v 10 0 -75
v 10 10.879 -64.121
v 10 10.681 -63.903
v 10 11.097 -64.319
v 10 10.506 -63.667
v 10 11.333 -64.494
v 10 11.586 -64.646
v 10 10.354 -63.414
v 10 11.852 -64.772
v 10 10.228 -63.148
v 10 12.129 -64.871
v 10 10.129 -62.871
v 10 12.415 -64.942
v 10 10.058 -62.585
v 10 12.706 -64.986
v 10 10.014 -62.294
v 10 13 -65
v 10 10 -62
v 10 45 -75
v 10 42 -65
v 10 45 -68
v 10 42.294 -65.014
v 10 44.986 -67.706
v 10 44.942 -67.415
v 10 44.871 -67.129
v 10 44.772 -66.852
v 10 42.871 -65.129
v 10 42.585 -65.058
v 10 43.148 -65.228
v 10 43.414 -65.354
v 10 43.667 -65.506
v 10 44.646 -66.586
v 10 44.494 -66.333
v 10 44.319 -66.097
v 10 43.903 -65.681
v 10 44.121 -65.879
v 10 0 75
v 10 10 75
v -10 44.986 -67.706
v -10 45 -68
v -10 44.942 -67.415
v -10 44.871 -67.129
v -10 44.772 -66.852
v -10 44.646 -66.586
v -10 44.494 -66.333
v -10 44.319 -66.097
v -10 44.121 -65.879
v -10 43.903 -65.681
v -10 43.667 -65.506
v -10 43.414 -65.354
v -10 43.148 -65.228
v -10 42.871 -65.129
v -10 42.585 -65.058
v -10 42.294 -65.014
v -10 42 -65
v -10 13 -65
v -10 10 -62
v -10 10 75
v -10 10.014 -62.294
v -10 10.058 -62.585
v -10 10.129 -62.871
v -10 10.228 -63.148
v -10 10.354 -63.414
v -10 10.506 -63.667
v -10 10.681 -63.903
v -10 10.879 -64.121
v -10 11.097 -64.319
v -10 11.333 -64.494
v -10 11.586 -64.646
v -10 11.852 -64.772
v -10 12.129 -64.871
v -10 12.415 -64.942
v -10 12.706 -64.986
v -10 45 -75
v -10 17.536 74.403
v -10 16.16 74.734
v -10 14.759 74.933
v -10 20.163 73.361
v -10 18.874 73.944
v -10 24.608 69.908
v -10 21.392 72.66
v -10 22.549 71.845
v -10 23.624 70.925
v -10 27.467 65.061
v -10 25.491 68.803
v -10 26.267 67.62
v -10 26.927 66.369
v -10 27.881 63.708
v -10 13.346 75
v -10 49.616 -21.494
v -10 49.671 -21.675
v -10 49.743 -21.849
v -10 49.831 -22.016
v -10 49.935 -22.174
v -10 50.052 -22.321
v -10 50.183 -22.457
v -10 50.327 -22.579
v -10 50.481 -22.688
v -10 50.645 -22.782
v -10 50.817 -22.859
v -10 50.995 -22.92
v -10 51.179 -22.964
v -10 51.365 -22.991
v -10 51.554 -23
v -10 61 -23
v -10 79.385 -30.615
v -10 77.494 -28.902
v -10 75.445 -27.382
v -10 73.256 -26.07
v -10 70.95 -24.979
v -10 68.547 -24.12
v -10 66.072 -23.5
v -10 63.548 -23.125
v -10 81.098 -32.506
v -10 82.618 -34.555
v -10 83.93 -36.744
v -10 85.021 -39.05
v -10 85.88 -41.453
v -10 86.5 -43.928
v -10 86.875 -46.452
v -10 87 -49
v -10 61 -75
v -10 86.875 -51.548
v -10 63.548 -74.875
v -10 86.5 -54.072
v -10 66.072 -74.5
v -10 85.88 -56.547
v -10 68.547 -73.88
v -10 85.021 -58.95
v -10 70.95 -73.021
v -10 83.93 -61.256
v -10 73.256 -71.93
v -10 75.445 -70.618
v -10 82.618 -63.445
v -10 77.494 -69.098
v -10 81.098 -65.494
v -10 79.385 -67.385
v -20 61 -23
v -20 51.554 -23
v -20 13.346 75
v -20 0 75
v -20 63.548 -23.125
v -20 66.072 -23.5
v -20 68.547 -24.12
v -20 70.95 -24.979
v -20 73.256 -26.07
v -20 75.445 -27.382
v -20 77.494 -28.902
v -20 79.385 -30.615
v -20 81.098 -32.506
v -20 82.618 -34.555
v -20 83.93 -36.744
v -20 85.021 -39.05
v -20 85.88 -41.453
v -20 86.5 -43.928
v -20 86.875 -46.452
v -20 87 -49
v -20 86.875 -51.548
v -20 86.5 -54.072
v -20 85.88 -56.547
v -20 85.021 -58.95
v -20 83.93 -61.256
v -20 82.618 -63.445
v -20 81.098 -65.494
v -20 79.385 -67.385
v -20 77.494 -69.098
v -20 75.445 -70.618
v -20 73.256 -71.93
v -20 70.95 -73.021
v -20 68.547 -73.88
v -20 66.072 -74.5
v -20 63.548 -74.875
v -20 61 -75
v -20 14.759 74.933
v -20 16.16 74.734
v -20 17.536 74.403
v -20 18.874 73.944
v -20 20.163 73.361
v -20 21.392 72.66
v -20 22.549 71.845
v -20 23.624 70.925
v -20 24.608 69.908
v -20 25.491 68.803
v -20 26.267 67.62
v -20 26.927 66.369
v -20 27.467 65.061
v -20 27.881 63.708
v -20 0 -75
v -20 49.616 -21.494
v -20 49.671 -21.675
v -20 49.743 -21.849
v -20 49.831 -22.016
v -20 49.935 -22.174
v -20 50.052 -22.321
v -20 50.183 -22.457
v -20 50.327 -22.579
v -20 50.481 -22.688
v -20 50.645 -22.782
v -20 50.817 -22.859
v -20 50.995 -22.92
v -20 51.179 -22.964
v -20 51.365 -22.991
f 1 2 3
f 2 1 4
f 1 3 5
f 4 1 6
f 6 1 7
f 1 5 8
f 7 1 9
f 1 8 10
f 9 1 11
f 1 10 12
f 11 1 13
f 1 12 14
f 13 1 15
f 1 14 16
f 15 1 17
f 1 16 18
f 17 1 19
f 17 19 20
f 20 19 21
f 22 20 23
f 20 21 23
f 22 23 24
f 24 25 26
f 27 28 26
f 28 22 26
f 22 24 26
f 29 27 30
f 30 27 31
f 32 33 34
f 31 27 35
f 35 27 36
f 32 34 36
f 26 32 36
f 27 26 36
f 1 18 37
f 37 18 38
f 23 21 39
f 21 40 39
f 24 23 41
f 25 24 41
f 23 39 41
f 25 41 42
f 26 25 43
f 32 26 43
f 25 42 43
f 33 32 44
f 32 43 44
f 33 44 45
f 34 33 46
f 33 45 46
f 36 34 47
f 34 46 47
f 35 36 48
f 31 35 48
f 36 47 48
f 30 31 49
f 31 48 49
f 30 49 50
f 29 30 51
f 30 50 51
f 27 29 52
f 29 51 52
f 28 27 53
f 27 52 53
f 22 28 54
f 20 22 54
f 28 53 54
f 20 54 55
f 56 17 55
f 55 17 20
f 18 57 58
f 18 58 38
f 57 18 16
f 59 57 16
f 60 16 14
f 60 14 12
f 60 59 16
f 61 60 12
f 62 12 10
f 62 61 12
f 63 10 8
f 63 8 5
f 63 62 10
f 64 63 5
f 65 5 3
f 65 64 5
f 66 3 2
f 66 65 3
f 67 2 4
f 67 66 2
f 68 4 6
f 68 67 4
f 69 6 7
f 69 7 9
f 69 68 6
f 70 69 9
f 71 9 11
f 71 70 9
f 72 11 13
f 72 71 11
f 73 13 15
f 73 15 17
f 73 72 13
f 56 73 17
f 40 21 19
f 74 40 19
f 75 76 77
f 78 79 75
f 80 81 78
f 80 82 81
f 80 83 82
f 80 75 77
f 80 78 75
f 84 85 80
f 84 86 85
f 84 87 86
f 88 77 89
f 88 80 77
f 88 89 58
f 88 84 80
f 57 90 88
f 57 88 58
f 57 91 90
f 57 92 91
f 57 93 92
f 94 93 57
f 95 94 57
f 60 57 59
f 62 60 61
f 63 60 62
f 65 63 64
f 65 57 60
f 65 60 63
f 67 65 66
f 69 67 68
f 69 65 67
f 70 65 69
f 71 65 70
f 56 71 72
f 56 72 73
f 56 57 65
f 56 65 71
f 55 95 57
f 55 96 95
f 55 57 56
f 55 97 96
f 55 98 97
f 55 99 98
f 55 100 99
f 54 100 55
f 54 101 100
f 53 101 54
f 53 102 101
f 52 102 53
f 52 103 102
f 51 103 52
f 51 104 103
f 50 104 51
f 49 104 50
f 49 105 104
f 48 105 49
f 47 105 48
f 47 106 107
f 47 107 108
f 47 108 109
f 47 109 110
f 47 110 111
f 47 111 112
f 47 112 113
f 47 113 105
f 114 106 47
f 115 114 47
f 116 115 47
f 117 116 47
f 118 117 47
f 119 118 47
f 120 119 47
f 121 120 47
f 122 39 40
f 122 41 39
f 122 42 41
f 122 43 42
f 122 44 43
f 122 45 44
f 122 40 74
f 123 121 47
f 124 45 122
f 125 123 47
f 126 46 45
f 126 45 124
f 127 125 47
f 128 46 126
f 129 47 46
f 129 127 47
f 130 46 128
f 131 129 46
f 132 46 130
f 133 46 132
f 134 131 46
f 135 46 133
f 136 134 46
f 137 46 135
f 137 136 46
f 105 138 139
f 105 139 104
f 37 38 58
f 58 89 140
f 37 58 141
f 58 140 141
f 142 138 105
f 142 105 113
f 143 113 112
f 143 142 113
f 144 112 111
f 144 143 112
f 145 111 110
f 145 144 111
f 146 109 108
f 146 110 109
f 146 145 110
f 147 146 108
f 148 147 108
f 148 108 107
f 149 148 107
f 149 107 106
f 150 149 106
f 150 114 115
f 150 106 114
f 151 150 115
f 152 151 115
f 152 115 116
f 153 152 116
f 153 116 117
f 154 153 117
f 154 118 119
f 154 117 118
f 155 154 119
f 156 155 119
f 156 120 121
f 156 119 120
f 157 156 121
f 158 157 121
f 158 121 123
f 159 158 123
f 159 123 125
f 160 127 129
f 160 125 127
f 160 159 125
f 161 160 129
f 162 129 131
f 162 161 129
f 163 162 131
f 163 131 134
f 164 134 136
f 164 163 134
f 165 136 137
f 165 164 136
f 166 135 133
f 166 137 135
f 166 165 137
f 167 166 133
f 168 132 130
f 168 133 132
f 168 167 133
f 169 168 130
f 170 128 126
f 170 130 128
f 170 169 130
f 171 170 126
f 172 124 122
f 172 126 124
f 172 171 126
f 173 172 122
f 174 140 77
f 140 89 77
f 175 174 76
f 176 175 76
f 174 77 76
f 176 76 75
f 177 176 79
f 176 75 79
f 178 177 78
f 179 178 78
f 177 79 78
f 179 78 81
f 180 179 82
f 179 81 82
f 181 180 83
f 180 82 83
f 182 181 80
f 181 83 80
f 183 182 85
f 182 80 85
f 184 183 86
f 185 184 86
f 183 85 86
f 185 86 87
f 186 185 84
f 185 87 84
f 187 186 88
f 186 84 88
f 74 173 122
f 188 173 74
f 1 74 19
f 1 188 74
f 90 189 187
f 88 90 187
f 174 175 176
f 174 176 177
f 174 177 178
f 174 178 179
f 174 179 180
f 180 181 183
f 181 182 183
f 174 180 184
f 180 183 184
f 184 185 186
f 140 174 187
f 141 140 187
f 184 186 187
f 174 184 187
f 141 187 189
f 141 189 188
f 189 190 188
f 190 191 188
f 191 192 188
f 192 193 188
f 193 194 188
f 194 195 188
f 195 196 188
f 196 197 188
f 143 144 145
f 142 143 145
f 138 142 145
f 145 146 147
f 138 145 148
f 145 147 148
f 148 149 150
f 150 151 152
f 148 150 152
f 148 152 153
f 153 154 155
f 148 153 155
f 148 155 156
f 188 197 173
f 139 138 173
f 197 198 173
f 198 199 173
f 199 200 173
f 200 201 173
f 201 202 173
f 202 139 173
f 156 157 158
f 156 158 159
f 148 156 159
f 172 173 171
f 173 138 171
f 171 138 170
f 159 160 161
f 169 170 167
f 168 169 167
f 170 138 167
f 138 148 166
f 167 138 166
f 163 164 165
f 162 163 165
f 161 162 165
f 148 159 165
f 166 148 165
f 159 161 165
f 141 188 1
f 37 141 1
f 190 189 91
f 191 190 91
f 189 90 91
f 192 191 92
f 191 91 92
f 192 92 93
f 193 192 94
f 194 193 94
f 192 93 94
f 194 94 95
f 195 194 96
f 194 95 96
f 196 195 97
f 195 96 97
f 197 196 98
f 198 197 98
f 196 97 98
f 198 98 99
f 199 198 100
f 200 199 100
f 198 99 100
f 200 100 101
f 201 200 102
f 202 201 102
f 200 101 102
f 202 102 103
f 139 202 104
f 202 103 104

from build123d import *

# Parameters (mm, degrees)
SKETCH1_W                = 82
SKETCH1_H                = 150
BOSS_EXTRUDE1_DEPTH      = 10
SKETCH2_W                = 10
SKETCH2_H                = 45
BOSS_EXTRUDE2_DEPTH      = 82
BOSS_EXTRUDE3_DEPTH      = 42
BOSS_EXTRUDE3_DEPTH_BACK = 10
FILLET3_RADIUS           = 26
FILLET3_LENGTH           = 10
FILLET4_RADIUS           = 26
FILLET4_LENGTH           = 10
BOSS_EXTRUDE4_DEPTH      = 10
BOSS_EXTRUDE5_DEPTH      = 10
FILLET5_R                = 15
FILLET6_R                = 15
SKETCH6_R                = 8
SKETCH6_R_2              = 5.5
CUT_EXTRUDE1_DEPTH       = 131.057679512
FILLET7_R                = 3
FILLET8_R                = 3
FILLET9_R                = 3
FILLET10_R               = 3
FILLET11_R               = 2
SKETCH7_R                = 5.5
CUT_EXTRUDE2_DEPTH       = 116.043470045
SKETCH8_W                = 188.706485039
SKETCH8_H                = 108.604028409
CUT_EXTRUDE3_DEPTH       = 126.678160394
SKETCH9_W                = 188.802330386
SKETCH9_H                = 115.284492933
CUT_EXTRUDE4_DEPTH       = 119.718153624
SKETCH10_W               = 24.217021772
SKETCH10_H               = 20.660675918
SKETCH10_W_2             = 13.71733401
SKETCH10_H_2             = 13.378634406
BOSS_EXTRUDE6_DEPTH      = 10


with BuildPart() as part:
    # Sketch1 → Boss-Extrude1 (new body)
    with BuildSketch(Plane(origin=(0, 0, 0), x_dir=(1, 0, 0), z_dir=(0, 1, 0))):
        Rectangle(SKETCH1_W, SKETCH1_H)
    extrude(amount=BOSS_EXTRUDE1_DEPTH)

    # Sketch2 → Boss-Extrude2 (add, through all)
    with BuildSketch(Plane(origin=(41, 0, 0), x_dir=(0, 0, -1), z_dir=(1, 0, 0))):
        with Locations((70, 22.5)):
            Rectangle(SKETCH2_W, SKETCH2_H)
    extrude(amount=-BOSS_EXTRUDE2_DEPTH)

    # Sketch3 → Boss-Extrude3 (add, two sides: drawn at the far end of the back side and taken through both)
    with BuildSketch(Plane.XY.offset(-65).offset(-BOSS_EXTRUDE3_DEPTH_BACK)):
        Polygon((10, 45), (10, 10), (20, 10), (20, 45), (20, 87), (10, 87), align=None)
        Polygon((-10, 45), (-10, 87), (-20, 87), (-20, 45), (-20, 10), (-10, 10), align=None)
    extrude(amount=BOSS_EXTRUDE3_DEPTH + BOSS_EXTRUDE3_DEPTH_BACK)

    # Fillet3: full round fillet: the end face becomes a half cylinder, R = half its width
    fillet3_face = Plane((15, 87, -49), x_dir=(-1, 0, 0), z_dir=(0, 1, 0))  # on the end face: x along it, z out of the body
    fillet3_slab = fillet3_face.offset(-FILLET3_RADIUS / 2) * Box(FILLET3_LENGTH, 2 * FILLET3_RADIUS, FILLET3_RADIUS, mode=Mode.PRIVATE)  # the body's end, R deep
    fillet3_round = Plane((15, 61, -49), x_dir=(0, 1, 0), z_dir=(-1, 0, 0)) * Cylinder(FILLET3_RADIUS, FILLET3_LENGTH, mode=Mode.PRIVATE)  # its axis R under the face
    add(fillet3_slab - fillet3_round, mode=Mode.SUBTRACT)

    # Fillet4: full round fillet: the end face becomes a half cylinder, R = half its width
    fillet4_face = Plane((-15, 87, -49), x_dir=(-1, 0, 0), z_dir=(0, 1, 0))  # on the end face: x along it, z out of the body
    fillet4_slab = fillet4_face.offset(-FILLET4_RADIUS / 2) * Box(FILLET4_LENGTH, 2 * FILLET4_RADIUS, FILLET4_RADIUS, mode=Mode.PRIVATE)  # the body's end, R deep
    fillet4_round = Plane((-15, 61, -49), x_dir=(0, 1, 0), z_dir=(-1, 0, 0)) * Cylinder(FILLET4_RADIUS, FILLET4_LENGTH, mode=Mode.PRIVATE)  # its axis R under the face
    add(fillet4_slab - fillet4_round, mode=Mode.SUBTRACT)

    # Sketch4 → Boss-Extrude4 (add)
    with BuildSketch(Plane(origin=(20, 0, 0), x_dir=(0, 0, -1), z_dir=(1, 0, 0))):
        Polygon((23, 10), (23, 50), (-75, 25), (-75, 10), align=None)
    extrude(amount=-BOSS_EXTRUDE4_DEPTH)

    # Sketch5 → Boss-Extrude5 (add)
    with BuildSketch(Plane.ZY.offset(20)):
        Polygon((-23, 50), (75, 25), (75, 10), (-23, 10), align=None)
    extrude(amount=-BOSS_EXTRUDE5_DEPTH)

    # Fillet5
    fillet5_edges = [part.edges().sort_by_distance(p)[0] for p in [
        (15, 25, 75),
    ]]
    fillet(fillet5_edges, radius=FILLET5_R)

    # Fillet6
    fillet6_edges = [part.edges().sort_by_distance(p)[0] for p in [
        (-15, 25, 75),
    ]]
    fillet(fillet6_edges, radius=FILLET6_R)

    # Sketch6 → Cut-Extrude1 (cut, through all)
    with BuildSketch(Plane(origin=(20, 0, 0), x_dir=(0, 0, -1), z_dir=(1, 0, 0))):
        with Locations((49, 61)):
            Circle(SKETCH6_R)
        with Locations((-60, 17.5)):
            Circle(SKETCH6_R_2)
    extrude(amount=-CUT_EXTRUDE1_DEPTH, mode=Mode.SUBTRACT)

    # Fillet7
    fillet7_edges = [part.edges().sort_by_distance(p)[0] for p in [
        (30.5, 45, -65),
    ]]
    fillet(fillet7_edges, radius=FILLET7_R)

    # Fillet8
    fillet8_edges = [part.edges().sort_by_distance(p)[0] for p in [
        (0, 45, -65),
    ]]
    fillet(fillet8_edges, radius=FILLET8_R)

    # Fillet9
    fillet9_edges = [part.edges().sort_by_distance(p)[0] for p in [
        (-30.5, 45, -65),
    ]]
    fillet(fillet9_edges, radius=FILLET9_R)

    # Fillet10
    fillet10_edges = [part.edges().sort_by_distance(p)[0] for p in [
        (30.5, 10, -65),
        (0, 10, -65),
        (-30.5, 10, -65),
    ]]
    fillet(fillet10_edges, radius=FILLET10_R)

    # Fillet11
    fillet11_edges = [part.edges().sort_by_distance(p)[0] for p in [
        (15, 50, -23),
        (-15, 50, -23),
    ]]
    fillet(fillet11_edges, radius=FILLET11_R)

    # Sketch7 → Cut-Extrude2 (cut, through all)
    with BuildSketch(Plane(origin=(0, 10, 0), x_dir=(1, 0, 0), z_dir=(0, 1, 0))):
        with Locations(Location((31.5, 45, 0), (0, 0, 270))):
            Circle(SKETCH7_R)
        with Locations(Location((31.5, -15, 0), (0, 0, 270))):
            Circle(SKETCH7_R)
        with Locations(Location((-31.5, -15, 0), (0, 0, 90))):
            Circle(SKETCH7_R)
        with Locations(Location((-31.5, 45, 0), (0, 0, 90))):
            Circle(SKETCH7_R)
    extrude(amount=-CUT_EXTRUDE2_DEPTH, mode=Mode.SUBTRACT)

    # Sketch8 → Cut-Extrude3 (cut, through all)
    with BuildSketch(Plane.ZY.offset(-10)):
        with Locations((0.093142392, 45.704427175)):
            Rectangle(SKETCH8_W, SKETCH8_H)
    extrude(amount=-CUT_EXTRUDE3_DEPTH, mode=Mode.SUBTRACT)

    # Sketch9 → Cut-Extrude4 (cut, through all)
    with BuildSketch(Plane.ZY.offset(20)):
        with Locations((2.13095181, 34.866066892)):
            Rectangle(SKETCH9_W, SKETCH9_H)
    extrude(amount=CUT_EXTRUDE4_DEPTH, mode=Mode.SUBTRACT)

    # Sketch10 → Boss-Extrude6 (add)
    with BuildSketch(Plane.ZY.offset(20)):
        with Locations((-48.857418051, 60.43498026)):
            Rectangle(SKETCH10_W, SKETCH10_H)
        with Locations((60.54255443, 16.996755893)):
            Rectangle(SKETCH10_W_2, SKETCH10_H_2)
    extrude(amount=-BOSS_EXTRUDE6_DEPTH)


solid = part.part
